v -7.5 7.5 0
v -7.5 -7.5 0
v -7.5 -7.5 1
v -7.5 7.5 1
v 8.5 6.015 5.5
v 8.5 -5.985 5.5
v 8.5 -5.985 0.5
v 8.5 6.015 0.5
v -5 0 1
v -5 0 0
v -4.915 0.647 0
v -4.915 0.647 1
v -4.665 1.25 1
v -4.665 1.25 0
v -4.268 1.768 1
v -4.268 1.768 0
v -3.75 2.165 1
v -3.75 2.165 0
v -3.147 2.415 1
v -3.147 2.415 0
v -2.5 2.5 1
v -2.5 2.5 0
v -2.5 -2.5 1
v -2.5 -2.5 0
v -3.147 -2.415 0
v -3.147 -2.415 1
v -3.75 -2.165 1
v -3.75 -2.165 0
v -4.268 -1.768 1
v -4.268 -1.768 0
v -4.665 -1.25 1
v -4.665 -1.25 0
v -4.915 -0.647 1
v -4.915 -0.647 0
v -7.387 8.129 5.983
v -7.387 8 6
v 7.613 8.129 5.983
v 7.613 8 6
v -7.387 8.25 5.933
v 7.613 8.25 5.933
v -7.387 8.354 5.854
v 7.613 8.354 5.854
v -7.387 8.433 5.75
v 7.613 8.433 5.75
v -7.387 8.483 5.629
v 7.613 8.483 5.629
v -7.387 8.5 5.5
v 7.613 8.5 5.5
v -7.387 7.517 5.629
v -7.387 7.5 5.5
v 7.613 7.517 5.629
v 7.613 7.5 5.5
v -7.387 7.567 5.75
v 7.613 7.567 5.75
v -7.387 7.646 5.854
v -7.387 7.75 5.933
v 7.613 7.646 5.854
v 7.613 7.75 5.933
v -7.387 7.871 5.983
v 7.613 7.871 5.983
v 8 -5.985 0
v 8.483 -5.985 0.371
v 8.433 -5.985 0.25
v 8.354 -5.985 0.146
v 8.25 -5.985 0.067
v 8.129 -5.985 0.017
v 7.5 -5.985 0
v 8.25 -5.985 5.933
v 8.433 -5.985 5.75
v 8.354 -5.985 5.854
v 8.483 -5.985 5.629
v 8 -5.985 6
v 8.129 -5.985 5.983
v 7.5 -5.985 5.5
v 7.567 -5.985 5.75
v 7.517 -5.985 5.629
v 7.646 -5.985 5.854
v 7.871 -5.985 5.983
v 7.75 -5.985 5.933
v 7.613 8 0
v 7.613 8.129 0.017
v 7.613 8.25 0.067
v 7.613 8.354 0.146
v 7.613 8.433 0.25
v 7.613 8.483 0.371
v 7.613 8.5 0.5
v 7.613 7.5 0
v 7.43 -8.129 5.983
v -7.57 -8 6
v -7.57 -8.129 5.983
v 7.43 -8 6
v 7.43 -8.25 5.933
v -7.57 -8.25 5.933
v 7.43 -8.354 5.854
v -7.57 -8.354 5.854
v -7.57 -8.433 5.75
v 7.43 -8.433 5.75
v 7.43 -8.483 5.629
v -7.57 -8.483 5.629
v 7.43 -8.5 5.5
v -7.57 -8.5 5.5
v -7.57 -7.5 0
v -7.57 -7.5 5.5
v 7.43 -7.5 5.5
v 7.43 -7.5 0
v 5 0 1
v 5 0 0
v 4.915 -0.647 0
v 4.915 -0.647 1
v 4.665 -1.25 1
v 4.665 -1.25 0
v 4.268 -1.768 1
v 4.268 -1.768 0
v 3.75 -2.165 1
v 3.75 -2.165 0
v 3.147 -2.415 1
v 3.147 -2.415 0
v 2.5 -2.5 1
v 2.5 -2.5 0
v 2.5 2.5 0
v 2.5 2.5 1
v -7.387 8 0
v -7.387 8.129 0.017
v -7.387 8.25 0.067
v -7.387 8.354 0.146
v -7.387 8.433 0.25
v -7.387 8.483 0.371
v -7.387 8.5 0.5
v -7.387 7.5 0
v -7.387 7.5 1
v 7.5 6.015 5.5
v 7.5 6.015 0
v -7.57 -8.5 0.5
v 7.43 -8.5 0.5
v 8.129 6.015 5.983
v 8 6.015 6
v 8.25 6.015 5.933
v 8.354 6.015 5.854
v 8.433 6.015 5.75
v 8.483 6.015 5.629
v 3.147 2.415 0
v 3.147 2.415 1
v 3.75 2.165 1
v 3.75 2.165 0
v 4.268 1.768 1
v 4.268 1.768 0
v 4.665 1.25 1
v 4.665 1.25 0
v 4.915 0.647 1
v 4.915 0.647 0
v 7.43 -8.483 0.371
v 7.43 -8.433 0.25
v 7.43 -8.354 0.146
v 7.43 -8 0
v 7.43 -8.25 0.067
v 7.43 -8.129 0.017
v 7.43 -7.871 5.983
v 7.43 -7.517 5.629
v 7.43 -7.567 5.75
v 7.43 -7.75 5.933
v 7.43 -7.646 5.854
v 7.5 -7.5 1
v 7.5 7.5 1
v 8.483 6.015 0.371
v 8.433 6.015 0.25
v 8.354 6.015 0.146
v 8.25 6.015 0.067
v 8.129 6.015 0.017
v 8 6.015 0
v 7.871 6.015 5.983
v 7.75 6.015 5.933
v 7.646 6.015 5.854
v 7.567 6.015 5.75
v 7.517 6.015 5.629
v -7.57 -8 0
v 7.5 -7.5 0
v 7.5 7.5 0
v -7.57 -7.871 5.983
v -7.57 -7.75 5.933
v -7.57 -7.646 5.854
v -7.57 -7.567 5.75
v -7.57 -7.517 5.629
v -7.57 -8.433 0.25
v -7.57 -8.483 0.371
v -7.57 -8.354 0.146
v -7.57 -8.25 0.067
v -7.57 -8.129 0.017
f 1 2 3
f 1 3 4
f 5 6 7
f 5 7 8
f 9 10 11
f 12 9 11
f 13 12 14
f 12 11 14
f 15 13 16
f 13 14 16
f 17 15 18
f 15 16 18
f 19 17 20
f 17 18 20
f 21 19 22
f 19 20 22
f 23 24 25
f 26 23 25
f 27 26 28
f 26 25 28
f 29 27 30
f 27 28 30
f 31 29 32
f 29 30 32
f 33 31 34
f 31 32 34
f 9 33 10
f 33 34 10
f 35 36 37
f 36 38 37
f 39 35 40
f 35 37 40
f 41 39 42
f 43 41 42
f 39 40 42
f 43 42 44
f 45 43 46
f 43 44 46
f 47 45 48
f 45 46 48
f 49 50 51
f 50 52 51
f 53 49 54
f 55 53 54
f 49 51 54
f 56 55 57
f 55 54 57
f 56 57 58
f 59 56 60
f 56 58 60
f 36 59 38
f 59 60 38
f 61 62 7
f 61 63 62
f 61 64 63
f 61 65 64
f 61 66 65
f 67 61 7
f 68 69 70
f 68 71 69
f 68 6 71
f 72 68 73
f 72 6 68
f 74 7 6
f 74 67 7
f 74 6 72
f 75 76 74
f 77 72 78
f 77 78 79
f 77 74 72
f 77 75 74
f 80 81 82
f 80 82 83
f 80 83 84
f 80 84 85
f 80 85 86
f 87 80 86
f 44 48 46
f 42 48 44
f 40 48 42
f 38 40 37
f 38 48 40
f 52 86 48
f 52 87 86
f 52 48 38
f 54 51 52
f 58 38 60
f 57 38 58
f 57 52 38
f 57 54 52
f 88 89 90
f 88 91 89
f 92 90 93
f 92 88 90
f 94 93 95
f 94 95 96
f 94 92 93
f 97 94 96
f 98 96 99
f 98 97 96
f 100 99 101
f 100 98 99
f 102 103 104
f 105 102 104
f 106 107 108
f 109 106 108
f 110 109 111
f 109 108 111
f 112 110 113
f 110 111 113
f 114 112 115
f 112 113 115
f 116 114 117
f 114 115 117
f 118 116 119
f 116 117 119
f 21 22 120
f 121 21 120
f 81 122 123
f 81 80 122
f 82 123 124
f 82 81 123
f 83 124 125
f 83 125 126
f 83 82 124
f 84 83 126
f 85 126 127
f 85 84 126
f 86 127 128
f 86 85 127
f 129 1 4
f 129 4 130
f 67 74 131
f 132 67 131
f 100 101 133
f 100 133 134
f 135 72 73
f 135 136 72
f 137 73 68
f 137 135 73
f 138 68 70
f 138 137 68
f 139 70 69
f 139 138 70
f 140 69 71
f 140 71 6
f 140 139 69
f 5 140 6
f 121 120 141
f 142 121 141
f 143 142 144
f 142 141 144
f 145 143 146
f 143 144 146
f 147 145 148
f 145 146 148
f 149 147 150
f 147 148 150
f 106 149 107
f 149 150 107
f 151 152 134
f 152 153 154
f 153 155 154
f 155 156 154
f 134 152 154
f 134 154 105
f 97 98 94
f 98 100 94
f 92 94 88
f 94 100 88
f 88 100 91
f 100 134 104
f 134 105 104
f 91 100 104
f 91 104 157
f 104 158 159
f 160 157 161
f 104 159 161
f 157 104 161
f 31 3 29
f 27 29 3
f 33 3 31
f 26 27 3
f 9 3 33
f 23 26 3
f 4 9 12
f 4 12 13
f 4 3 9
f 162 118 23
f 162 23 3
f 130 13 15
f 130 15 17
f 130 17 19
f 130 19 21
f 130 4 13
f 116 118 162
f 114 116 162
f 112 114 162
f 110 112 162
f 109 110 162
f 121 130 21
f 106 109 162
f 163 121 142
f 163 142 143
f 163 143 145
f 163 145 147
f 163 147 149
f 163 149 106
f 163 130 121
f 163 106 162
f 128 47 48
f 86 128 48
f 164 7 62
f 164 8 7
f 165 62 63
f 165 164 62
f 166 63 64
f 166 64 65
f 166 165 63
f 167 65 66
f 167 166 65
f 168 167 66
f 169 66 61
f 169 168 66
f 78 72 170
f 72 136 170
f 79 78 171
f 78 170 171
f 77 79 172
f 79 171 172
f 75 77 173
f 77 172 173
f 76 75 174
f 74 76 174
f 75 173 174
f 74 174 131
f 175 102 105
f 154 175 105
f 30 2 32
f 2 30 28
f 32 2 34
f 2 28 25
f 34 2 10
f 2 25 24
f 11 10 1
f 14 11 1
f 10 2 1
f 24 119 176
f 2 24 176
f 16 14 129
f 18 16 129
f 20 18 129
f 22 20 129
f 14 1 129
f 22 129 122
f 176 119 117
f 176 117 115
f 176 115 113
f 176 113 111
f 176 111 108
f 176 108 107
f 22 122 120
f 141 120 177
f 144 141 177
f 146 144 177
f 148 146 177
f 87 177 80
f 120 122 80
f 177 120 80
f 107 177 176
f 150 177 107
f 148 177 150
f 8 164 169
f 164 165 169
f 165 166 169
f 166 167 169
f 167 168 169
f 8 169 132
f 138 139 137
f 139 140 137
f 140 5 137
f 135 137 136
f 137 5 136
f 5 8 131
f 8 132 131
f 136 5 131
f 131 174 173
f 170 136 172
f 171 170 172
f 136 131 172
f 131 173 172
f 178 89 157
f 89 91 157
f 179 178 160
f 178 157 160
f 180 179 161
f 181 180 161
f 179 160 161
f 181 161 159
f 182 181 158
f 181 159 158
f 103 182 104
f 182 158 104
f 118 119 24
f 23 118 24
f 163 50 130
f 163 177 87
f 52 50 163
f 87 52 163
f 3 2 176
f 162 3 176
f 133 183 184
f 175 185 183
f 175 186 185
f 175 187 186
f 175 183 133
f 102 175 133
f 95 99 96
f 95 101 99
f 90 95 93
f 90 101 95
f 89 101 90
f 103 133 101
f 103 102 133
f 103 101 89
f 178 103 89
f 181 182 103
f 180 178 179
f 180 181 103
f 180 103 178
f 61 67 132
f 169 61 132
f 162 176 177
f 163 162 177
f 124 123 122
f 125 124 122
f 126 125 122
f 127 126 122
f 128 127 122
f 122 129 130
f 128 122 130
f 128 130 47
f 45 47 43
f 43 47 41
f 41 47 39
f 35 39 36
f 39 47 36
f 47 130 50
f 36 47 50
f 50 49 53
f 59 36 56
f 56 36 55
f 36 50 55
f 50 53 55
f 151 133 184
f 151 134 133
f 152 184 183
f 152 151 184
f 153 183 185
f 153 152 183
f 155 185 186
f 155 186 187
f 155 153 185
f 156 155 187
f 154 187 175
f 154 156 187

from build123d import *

# Parameters (mm, degrees)
F9_W      = 12
F9_H      = 6
F10_DEPTH = 1
F8_W      = 15
F8_H      = 6
F11_DEPTH = 1
F7_W      = 15
F7_H      = 6
F12_DEPTH = 1
F0_W      = 15
F0_H      = 15
F13_DEPTH = 1
F14_R     = 0.5
F15_R     = 0.49999
F15_2_R   = 0.49999
F16_R     = 0.49999
F16_2_R   = 0.49999
F17_DEPTH = 1


# Not quite as in the source:
# - a fillet or chamfer is up to 0.001 mm smaller than in the source, because OpenCascade refuses the exact size


with BuildPart() as f10:
    # F9 (on plane+point) → F10 (new body)
    with BuildSketch(Plane.YZ.offset(7.5)):
        with Locations((0.0150063767, 3)):
            Rectangle(F9_W, F9_H)
    extrude(amount=F10_DEPTH)

    # F14
    f14_edges = [f10.edges().sort_by_distance(p)[0] for p in [
        (8.5, 0.015006, 6),
    ]]
    fillet(f14_edges, radius=F14_R)

    # F15 (radius 0.5 in the source; OpenCascade refuses exactly that, so slightly less here)
    f15_edges = [f10.edges().sort_by_distance(p)[0] for p in [
        (7.5, 0.015006, 6),
        (8.5, 0.015006, 0),
    ]]
    fillet(f15_edges, radius=F15_R)

    # F0 (on Top) → F17 (cut)
    with BuildSketch(Plane.XY):
        with BuildLine():
            Line((2.5, 2.5), (-2.5, 2.5))
            ThreePointArc((-2.5, 2.5), (-4.267766953, 1.767766953), (-5, 0))
            ThreePointArc((-5, 0), (-4.267766953, -1.767766953), (-2.5, -2.5))
            Line((-2.5, -2.5), (2.5, -2.5))
            ThreePointArc((2.5, -2.5), (4.267766953, -1.767766953), (5, 0))
            ThreePointArc((5, 0), (4.267766953, 1.767766953), (2.5, 2.5))
        make_face()
    extrude(amount=F17_DEPTH, mode=Mode.SUBTRACT)


with BuildPart() as f11:
    # F8 (on plane+point) → F11 (new body)
    with BuildSketch(Plane.XZ.offset(-7.5)):
        with Locations((0.1134890686, 3)):
            Rectangle(F8_W, F8_H)
    extrude(amount=-F11_DEPTH)

    # F0 (on Top) → F13 (join)
    with BuildSketch(Plane.XY):
        Rectangle(F0_W, F0_H)
        with BuildLine():
            ThreePointArc((-5, 0), (-4.267766953, 1.767766953), (-2.5, 2.5))
            Line((-2.5, 2.5), (2.5, 2.5))
            ThreePointArc((2.5, 2.5), (4.267766953, 1.767766953), (5, 0))
            ThreePointArc((5, 0), (4.267766953, -1.767766953), (2.5, -2.5))
            Line((2.5, -2.5), (-2.5, -2.5))
            ThreePointArc((-2.5, -2.5), (-4.267766953, -1.767766953), (-5, 0))
        make_face(mode=Mode.SUBTRACT)
    extrude(amount=F13_DEPTH)

    # F16#2 (radius 0.5 in the source; OpenCascade refuses exactly that, so slightly less here)
    f16_2_edges = [f11.edges().sort_by_distance(p)[0] for p in [
        (0.113489, 8.5, 0),
        (0.113489, 8.5, 6),
        (0.113489, 7.5, 6),
    ]]
    fillet(f16_2_edges, radius=F16_2_R)


with BuildPart() as f12:
    # F7 (on plane+point) → F12 (new body)
    with BuildSketch(Plane.XZ.offset(7.5)):
        with Locations((-0.0702422911, 3)):
            Rectangle(F7_W, F7_H)
    extrude(amount=F12_DEPTH)

    # F15#2 (radius 0.5 in the source; OpenCascade refuses exactly that, so slightly less here)
    f15_2_edges = [f12.edges().sort_by_distance(p)[0] for p in [
        (-0.070242, -8.5, 6),
        (-0.070242, -7.5, 6),
    ]]
    fillet(f15_2_edges, radius=F15_2_R)

    # F16 (radius 0.5 in the source; OpenCascade refuses exactly that, so slightly less here)
    f16_edges = [f12.edges().sort_by_distance(p)[0] for p in [
        (-0.070242, -8.5, 0),
    ]]
    fillet(f16_edges, radius=F16_R)


solid = Compound([f10.part, f11.part, f12.part])
